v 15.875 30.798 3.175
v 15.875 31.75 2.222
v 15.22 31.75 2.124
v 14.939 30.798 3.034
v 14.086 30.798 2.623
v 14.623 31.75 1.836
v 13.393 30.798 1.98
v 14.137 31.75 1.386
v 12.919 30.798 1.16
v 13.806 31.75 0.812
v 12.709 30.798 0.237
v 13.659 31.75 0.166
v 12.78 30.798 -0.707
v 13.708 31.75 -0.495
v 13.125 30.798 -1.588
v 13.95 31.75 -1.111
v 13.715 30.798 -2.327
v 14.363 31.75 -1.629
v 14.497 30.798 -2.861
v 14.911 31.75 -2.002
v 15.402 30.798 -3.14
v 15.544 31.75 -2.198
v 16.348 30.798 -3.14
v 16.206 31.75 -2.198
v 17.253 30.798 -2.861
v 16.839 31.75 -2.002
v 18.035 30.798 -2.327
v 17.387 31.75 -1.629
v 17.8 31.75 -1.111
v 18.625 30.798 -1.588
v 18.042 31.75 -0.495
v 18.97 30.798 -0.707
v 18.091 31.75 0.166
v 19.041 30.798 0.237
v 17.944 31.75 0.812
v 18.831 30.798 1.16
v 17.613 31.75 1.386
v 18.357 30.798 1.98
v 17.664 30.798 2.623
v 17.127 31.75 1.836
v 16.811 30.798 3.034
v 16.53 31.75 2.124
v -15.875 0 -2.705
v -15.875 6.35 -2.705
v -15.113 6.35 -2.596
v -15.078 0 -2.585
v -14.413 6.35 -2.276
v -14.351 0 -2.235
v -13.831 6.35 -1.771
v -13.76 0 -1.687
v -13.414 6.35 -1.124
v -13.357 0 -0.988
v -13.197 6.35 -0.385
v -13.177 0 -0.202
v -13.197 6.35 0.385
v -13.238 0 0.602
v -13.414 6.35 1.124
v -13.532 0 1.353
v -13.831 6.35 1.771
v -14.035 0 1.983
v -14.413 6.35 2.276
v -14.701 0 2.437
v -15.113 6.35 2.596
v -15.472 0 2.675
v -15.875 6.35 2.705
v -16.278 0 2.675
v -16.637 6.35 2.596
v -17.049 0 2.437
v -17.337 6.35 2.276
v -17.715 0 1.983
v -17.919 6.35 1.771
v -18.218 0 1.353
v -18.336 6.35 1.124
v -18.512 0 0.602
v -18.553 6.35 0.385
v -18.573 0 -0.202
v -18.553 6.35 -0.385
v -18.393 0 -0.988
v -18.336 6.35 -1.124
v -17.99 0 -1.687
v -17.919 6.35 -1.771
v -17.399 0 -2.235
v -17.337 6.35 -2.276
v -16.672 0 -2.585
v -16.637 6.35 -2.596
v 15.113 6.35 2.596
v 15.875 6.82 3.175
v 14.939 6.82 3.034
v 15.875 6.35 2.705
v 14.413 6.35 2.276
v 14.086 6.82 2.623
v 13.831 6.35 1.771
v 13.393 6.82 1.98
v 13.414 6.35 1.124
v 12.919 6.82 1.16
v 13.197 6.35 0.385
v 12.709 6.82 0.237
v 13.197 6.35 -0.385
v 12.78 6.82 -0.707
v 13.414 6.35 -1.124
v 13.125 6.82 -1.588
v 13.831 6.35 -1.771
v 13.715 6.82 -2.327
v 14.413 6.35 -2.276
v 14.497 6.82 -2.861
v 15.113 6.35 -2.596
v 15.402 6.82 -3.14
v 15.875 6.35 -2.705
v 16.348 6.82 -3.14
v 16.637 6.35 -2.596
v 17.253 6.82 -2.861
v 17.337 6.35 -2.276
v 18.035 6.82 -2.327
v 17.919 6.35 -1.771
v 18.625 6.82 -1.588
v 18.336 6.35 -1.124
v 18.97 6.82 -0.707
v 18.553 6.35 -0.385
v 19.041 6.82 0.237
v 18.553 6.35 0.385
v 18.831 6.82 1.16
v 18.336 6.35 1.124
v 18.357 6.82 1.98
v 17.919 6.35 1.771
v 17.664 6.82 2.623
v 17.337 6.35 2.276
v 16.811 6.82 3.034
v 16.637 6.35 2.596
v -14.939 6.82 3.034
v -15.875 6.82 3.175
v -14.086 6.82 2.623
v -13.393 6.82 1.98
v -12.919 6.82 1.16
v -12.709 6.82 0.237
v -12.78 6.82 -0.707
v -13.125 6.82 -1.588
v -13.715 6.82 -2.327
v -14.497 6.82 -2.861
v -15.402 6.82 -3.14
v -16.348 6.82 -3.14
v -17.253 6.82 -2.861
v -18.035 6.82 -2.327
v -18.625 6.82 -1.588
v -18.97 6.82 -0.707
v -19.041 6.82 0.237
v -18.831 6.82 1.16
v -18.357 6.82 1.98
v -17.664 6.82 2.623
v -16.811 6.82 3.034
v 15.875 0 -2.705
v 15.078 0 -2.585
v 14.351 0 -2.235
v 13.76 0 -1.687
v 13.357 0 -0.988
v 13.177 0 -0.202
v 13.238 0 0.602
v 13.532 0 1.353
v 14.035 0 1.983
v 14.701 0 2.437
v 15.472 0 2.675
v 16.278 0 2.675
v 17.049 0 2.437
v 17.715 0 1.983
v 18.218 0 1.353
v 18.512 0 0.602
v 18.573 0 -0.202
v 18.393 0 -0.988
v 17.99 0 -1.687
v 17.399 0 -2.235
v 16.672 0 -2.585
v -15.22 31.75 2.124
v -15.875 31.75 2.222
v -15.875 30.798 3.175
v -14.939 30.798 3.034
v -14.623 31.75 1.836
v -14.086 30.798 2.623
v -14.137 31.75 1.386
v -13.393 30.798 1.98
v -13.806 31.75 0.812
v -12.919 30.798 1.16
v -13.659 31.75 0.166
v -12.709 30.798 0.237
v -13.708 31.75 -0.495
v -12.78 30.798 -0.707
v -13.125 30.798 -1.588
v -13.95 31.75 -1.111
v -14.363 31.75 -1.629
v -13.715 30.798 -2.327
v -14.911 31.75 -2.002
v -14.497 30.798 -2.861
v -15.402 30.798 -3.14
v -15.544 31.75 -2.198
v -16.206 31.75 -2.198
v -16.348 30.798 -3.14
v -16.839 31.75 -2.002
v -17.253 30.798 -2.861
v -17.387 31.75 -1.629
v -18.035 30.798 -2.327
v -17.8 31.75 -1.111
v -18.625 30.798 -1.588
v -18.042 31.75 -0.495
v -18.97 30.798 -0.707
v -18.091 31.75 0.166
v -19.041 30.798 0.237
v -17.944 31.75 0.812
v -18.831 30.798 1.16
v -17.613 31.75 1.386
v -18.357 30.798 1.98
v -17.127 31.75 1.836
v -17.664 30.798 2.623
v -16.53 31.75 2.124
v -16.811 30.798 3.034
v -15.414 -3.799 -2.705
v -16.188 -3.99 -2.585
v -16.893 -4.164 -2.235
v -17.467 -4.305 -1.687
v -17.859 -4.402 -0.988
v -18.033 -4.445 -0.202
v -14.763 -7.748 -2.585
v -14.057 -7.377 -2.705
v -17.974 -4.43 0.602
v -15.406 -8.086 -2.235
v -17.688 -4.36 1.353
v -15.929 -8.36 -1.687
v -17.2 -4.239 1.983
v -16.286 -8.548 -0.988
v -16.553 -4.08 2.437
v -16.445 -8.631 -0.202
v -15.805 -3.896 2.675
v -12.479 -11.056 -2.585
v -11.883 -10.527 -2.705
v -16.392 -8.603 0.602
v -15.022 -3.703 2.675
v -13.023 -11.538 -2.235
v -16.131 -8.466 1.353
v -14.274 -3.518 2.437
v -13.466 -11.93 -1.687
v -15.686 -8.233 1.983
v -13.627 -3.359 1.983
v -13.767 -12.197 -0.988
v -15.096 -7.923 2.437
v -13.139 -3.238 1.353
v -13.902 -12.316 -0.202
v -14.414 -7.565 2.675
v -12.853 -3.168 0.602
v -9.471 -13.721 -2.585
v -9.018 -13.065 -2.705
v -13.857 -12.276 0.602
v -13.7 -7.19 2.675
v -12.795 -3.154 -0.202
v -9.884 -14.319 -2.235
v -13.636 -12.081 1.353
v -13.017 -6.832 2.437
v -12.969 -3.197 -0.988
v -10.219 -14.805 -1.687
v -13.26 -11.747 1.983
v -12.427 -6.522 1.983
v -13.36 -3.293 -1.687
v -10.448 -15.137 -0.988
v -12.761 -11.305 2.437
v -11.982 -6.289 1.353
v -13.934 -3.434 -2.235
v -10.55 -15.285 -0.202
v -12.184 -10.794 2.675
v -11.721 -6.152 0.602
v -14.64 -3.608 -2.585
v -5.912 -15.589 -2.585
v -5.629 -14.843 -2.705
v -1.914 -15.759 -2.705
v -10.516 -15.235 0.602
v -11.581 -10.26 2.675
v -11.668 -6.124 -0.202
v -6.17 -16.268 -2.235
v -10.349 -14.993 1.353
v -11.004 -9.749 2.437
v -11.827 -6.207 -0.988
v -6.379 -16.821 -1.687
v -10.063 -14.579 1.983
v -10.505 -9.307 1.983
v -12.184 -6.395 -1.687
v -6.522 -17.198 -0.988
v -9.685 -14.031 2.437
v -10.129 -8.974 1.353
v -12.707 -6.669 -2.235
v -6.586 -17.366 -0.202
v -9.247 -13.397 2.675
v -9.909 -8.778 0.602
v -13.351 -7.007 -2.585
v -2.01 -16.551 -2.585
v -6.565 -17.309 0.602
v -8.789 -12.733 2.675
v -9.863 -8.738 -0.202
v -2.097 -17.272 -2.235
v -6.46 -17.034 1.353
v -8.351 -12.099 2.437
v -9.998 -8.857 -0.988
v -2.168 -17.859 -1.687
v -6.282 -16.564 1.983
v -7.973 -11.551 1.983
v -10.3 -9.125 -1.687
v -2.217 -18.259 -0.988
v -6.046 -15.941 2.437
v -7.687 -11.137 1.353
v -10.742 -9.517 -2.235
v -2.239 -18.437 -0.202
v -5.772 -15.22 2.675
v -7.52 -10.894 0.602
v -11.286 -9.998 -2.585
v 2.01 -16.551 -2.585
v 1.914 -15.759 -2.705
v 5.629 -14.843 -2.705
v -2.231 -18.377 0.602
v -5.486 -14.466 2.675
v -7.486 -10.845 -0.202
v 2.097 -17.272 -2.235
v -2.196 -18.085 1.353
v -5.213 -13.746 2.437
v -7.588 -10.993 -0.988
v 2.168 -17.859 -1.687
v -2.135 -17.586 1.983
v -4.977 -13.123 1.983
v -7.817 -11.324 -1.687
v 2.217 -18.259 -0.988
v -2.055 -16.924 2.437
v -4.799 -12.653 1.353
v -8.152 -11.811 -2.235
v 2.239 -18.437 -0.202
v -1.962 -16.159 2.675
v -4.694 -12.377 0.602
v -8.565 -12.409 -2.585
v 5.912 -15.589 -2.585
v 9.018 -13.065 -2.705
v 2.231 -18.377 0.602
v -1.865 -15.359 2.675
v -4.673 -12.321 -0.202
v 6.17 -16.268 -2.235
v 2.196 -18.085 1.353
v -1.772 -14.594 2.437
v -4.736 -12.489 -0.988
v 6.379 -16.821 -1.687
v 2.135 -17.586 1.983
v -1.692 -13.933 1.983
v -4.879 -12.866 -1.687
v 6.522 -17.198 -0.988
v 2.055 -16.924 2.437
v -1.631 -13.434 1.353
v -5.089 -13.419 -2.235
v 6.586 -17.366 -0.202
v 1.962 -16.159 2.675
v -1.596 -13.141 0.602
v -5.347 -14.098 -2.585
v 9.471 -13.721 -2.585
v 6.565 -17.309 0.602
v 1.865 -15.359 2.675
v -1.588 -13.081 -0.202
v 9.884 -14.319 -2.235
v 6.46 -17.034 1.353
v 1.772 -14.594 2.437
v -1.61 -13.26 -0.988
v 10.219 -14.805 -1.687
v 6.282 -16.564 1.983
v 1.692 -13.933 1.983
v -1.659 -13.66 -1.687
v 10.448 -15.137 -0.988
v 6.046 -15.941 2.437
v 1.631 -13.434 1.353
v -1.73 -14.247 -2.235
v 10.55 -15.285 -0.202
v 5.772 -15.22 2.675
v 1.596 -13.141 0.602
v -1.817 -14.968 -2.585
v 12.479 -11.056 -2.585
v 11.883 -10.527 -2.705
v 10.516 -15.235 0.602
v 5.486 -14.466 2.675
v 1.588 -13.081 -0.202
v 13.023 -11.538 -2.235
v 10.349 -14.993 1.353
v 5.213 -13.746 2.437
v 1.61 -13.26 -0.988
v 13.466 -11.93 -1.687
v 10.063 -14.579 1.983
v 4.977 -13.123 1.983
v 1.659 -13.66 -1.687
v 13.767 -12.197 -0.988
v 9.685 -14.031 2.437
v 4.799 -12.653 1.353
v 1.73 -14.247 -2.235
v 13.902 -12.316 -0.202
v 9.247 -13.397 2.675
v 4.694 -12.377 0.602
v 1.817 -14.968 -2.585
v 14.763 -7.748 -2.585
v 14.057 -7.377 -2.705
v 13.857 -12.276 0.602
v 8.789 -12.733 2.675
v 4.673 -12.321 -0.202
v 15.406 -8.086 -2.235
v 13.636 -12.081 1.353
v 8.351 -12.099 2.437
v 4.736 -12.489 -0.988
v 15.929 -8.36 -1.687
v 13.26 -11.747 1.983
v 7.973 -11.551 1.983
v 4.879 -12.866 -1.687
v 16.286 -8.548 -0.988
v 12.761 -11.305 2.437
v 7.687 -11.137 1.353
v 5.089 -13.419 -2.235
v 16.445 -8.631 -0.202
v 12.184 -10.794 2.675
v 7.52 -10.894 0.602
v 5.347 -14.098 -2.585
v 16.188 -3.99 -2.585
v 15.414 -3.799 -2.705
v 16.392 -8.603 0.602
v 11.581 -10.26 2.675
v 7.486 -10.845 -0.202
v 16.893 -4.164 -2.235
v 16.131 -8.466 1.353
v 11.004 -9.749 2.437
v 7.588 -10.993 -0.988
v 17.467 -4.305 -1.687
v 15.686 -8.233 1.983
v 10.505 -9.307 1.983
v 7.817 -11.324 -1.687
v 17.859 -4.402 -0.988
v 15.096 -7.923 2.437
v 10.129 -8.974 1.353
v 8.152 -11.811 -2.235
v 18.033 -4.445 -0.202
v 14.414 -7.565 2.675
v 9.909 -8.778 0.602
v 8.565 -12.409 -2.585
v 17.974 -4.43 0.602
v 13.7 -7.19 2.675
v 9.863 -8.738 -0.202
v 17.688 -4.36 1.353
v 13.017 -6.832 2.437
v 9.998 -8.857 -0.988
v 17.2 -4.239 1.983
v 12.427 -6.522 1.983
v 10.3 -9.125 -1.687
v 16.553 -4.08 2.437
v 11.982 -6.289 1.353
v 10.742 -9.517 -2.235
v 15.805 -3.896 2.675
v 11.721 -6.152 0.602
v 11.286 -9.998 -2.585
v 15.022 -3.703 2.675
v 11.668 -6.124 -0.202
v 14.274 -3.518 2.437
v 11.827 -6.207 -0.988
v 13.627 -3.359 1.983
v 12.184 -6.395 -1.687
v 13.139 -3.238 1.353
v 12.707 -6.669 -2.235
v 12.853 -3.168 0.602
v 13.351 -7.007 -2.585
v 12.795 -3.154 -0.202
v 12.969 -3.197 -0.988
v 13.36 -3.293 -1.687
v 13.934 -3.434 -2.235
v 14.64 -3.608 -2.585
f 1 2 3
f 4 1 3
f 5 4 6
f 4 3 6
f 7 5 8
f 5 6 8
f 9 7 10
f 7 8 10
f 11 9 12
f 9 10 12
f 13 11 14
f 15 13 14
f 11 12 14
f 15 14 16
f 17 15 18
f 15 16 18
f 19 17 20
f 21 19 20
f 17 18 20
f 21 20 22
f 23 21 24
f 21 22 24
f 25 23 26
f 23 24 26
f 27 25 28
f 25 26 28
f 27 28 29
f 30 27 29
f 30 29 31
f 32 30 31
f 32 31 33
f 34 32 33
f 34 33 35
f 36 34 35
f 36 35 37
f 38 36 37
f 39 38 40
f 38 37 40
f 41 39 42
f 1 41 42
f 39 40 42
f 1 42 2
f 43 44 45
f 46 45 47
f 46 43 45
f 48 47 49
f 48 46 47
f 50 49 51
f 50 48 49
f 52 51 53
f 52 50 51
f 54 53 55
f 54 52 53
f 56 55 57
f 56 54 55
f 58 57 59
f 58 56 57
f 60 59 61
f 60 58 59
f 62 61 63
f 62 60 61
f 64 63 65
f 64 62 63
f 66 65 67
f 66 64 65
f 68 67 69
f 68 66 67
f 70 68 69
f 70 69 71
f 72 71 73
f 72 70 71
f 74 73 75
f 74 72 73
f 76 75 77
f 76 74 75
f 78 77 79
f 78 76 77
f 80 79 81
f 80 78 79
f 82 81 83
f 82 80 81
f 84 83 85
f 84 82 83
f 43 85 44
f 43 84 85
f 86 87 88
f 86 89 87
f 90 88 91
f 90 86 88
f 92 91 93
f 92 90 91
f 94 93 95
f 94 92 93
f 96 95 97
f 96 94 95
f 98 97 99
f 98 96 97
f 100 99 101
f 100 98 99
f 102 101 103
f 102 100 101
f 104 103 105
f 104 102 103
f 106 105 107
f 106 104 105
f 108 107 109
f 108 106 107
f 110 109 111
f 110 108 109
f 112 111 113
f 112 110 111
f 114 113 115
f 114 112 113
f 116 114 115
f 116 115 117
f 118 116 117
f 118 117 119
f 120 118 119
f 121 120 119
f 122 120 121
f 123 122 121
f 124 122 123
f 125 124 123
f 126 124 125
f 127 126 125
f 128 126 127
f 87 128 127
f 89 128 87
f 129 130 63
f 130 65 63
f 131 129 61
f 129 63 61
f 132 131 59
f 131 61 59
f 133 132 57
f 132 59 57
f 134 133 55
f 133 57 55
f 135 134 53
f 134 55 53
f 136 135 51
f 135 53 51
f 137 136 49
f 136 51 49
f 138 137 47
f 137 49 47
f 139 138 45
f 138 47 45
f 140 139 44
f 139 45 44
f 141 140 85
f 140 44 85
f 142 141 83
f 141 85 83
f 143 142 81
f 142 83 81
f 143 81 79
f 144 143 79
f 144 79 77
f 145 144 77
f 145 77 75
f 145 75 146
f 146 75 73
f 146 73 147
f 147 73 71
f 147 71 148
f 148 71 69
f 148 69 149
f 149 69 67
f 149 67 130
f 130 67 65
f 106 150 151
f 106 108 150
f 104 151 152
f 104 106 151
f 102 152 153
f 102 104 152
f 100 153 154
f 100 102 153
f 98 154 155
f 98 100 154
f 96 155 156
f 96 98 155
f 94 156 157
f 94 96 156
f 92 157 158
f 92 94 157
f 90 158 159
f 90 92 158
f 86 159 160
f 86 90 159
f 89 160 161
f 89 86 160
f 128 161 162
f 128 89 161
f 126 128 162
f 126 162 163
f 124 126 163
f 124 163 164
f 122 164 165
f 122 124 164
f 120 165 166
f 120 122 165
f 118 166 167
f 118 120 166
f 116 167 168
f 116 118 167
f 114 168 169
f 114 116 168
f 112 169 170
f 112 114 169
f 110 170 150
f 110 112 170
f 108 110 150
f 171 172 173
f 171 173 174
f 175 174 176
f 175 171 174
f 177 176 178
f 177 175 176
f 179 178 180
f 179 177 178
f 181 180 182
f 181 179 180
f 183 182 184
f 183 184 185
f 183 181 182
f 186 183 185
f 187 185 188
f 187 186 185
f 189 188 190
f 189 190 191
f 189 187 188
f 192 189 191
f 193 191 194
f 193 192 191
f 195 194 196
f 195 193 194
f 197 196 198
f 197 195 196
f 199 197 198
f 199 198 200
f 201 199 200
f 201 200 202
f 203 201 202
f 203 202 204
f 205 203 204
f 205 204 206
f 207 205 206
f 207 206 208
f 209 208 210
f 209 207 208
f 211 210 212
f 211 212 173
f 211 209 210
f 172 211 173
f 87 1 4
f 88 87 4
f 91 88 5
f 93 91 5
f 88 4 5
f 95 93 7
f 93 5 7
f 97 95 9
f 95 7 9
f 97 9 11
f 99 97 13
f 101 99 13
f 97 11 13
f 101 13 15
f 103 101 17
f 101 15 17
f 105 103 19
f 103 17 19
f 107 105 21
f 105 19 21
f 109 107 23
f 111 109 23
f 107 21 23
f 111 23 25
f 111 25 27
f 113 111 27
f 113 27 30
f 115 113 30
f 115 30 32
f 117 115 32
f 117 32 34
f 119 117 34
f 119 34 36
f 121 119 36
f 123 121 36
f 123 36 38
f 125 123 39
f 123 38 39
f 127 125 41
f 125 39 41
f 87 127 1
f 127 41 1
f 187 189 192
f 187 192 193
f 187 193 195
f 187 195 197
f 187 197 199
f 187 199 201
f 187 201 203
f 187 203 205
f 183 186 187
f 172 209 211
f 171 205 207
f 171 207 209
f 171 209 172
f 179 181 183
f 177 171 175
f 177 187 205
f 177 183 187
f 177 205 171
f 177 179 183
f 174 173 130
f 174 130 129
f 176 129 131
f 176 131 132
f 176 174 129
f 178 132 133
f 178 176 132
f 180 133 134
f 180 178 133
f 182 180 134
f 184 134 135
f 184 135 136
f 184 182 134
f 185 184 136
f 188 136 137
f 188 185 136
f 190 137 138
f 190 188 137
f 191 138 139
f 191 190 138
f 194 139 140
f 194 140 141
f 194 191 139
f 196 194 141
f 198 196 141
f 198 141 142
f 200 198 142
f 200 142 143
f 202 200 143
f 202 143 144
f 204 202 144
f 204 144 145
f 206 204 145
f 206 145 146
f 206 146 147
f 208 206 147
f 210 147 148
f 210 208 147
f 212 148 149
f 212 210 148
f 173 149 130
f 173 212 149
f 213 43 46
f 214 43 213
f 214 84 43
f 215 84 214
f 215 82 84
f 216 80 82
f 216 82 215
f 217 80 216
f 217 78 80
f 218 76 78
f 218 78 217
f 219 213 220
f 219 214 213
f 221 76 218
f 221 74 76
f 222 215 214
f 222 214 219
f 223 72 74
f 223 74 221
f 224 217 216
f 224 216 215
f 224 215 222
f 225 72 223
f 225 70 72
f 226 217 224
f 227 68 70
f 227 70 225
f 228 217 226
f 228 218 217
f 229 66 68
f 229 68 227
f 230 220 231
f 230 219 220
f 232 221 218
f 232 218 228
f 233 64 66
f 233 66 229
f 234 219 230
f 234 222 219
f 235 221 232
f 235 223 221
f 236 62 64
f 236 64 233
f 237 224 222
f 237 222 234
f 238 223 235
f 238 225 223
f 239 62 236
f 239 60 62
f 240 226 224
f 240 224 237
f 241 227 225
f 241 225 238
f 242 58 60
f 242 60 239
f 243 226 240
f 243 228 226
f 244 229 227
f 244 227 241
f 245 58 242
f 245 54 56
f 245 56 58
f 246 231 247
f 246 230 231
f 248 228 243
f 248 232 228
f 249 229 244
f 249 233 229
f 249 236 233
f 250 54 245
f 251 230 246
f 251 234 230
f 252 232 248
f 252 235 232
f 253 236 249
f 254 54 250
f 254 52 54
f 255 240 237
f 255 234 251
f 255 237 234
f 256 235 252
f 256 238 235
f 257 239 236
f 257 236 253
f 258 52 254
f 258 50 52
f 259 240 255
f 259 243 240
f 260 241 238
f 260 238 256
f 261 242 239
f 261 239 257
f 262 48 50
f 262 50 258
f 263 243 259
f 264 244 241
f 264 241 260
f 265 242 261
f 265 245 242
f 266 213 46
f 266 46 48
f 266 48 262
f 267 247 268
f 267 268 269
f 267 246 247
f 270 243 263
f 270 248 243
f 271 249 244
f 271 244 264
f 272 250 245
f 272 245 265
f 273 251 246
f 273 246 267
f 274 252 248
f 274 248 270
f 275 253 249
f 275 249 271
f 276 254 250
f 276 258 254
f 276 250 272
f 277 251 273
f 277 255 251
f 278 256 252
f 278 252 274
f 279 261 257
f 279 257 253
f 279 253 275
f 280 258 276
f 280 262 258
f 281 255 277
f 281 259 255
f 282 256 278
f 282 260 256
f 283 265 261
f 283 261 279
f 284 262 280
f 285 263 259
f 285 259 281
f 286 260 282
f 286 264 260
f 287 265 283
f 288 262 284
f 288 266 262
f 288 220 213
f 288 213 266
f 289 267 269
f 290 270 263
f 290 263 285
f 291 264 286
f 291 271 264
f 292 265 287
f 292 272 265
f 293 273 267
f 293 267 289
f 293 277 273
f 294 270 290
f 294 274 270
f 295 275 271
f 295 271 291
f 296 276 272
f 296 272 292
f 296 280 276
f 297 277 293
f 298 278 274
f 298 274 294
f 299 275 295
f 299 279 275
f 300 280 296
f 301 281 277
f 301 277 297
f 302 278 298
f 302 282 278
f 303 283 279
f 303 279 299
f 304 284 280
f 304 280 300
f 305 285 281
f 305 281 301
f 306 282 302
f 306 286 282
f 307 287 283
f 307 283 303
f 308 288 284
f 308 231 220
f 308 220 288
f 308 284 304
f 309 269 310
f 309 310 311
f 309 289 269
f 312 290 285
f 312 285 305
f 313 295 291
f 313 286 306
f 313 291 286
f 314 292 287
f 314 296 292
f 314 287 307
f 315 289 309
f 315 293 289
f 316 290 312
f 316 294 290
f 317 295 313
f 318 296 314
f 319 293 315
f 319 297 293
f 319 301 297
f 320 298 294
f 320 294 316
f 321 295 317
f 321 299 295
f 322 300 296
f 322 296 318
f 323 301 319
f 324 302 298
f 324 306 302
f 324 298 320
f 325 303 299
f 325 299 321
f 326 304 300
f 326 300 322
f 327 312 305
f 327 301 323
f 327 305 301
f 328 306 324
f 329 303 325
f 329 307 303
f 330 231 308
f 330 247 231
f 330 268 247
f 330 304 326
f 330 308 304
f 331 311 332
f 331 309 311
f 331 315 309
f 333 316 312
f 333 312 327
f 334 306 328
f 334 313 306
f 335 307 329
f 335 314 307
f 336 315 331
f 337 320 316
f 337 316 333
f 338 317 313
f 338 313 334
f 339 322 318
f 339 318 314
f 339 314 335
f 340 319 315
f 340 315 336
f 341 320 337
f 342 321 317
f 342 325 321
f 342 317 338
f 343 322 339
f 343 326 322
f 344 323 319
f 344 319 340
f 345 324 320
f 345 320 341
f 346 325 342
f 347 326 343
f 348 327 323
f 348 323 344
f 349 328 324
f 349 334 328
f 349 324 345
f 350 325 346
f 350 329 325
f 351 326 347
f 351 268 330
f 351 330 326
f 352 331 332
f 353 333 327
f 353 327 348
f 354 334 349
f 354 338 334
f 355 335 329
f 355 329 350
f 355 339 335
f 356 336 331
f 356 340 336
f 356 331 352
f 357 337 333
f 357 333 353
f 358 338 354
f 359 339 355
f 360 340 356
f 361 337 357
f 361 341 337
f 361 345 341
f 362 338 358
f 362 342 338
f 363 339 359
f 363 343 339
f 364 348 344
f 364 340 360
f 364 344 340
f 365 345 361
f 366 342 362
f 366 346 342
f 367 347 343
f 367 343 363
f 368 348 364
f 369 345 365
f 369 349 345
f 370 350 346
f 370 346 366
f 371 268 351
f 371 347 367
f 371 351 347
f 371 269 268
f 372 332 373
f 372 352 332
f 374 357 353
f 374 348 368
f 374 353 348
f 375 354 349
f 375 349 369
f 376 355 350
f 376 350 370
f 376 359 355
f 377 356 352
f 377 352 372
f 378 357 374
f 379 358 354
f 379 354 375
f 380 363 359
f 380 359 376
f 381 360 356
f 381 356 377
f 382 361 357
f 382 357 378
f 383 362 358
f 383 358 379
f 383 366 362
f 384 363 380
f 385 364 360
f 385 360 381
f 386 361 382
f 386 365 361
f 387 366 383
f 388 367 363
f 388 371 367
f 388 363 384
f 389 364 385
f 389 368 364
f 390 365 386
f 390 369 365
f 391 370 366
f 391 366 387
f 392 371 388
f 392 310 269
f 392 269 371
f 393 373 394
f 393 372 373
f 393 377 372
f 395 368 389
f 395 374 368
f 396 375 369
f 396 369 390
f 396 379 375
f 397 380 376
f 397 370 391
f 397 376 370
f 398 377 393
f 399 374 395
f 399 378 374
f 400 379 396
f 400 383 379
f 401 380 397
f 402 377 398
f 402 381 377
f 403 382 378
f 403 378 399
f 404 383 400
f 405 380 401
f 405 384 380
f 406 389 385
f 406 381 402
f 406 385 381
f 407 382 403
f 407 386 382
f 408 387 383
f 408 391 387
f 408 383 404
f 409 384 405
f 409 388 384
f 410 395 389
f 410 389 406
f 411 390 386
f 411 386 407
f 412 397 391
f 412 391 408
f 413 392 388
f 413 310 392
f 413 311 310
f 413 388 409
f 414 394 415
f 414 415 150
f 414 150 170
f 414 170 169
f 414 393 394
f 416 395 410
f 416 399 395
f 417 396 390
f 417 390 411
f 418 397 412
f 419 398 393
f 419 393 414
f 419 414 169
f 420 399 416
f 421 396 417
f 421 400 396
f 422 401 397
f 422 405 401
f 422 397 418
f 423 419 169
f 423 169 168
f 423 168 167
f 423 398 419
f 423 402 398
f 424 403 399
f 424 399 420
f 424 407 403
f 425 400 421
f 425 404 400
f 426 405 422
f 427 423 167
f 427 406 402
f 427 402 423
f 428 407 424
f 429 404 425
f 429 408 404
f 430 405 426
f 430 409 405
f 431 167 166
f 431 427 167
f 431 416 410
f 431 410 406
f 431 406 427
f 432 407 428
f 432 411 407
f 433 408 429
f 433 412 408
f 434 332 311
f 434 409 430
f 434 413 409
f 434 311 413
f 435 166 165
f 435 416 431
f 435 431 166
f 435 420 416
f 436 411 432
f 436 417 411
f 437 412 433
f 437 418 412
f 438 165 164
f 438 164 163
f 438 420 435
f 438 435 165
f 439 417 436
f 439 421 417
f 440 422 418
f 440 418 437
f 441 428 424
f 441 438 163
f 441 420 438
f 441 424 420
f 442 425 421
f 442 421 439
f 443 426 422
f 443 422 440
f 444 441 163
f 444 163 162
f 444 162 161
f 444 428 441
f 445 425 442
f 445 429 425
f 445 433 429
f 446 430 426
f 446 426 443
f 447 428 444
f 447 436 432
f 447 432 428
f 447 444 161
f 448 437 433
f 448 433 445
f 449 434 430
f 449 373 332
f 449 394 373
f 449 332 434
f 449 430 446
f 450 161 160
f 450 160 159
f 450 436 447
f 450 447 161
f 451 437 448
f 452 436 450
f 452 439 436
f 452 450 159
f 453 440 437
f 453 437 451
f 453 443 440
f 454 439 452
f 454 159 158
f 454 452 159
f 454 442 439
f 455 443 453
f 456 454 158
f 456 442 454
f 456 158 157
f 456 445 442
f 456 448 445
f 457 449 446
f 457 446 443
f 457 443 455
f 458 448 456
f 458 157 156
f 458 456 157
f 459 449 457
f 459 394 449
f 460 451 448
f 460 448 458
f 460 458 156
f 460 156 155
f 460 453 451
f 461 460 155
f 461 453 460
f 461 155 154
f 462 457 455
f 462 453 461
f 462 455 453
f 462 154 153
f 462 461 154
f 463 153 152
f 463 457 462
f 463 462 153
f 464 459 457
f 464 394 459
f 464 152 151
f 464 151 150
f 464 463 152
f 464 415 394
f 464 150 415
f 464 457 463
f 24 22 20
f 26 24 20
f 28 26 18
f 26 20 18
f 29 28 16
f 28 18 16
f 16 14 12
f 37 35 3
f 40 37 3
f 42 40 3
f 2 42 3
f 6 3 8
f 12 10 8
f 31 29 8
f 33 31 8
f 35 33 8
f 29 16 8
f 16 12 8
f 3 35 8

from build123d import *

# Parameters (mm, degrees)
SKETCH2_R           = 3.175
BOSS_EXTRUDE1_DEPTH = 25.4
CHAMFER2_SIZE       = 0.9525
CHAMFER3_SIZE       = 0.4699
SKETCH12_R          = 2.7051
SKETCH9_R           = 3.175
BOSS_EXTRUDE2_DEPTH = 2.778125
SKETCH10_OUTSIDE_W  = 233.937
SKETCH10_OUTSIDE_H  = 203.708
SKETCH10_OUTSIDE_R  = 5.55625
CUT_EXTRUDE1_DEPTH  = 51.205782884
CUT_EXTRUDE1_DRAFT  = -60
SKETCH11_OUTSIDE_W  = 217.071
SKETCH11_OUTSIDE_H  = 186.842
SKETCH11_OUTSIDE_R  = 5.55625
CUT_EXTRUDE2_DEPTH  = 46.336665415
CUT_EXTRUDE2_DRAFT  = -60
CHAMFER4_SIZE       = 0.381
LPATTERN1_COUNT     = 2
LPATTERN1_PITCH     = 31.75


with BuildPart() as part:
    # Sketch2 → Boss-Extrude1 (new body)
    with BuildSketch(Plane(origin=(0, 31.75, 0), x_dir=(-1, 0, 0), z_dir=(0, 1, 0))):
        with Locations(Location((15.875, 0, 0), (0, 0, 90))):
            Circle(SKETCH2_R)
    extrude(amount=-BOSS_EXTRUDE1_DEPTH)

    # Chamfer2
    chamfer2_edges = [part.edges().sort_by_distance(p)[0] for p in [
        (-15.875, 31.75, -3.175),
    ]]
    chamfer(chamfer2_edges, length=CHAMFER2_SIZE)

    # Chamfer3
    chamfer3_edges = [part.edges().sort_by_distance(p)[0] for p in [
        (-15.875, 6.35, -3.175),
    ]]
    chamfer(chamfer3_edges, length=CHAMFER3_SIZE)


with BuildPart() as body_2:
    # Mirror2: mirrored copy
    add(part.part.mirror(Plane(origin=(0, 0, 0), x_dir=(0, 0, 1), z_dir=(1, 0, 0))))


with BuildPart() as part_1:
    add(part.part)

    add(body_2.part)  # Sweep1 merges body 2
    # Sweep1: sweep along a path in Sketch8
    with BuildLine(Plane.XY) as sweep1_path:
        Line((-15.875, 19.05), (-15.875, 0))
        ThreePointArc((-15.875, 0), (0, -15.875), (15.875, 0))
        Line((15.875, 0), (15.875, 19.05))
    # Sketch12 → Sweep1 (sweep)
    with BuildSketch(Plane(origin=(0, 0, 0), x_dir=(0, 0, -1), z_dir=(1, 0, 0))):
        with Locations((0, -15.875)):
            Circle(SKETCH12_R)
    sweep(path=sweep1_path.line)


with BuildPart() as body_2_2:
    # Sketch9 → Boss-Extrude2 (new, symmetric)
    with BuildSketch(Plane(origin=(0, 23.283333333, 0), x_dir=(-1, 0, 0), z_dir=(0, 1, 0))):
        Polygon((-19.082902433, 5.55625), (-22.290804866, 0), (-19.082902433, -5.55625), (-12.667097567, -5.55625), (-9.459195134, 0), (-12.667097567, 5.55625), align=None)
        with Locations(Location((-15.875, 0, 0), (0, 0, 90))):
            Circle(SKETCH9_R, mode=Mode.SUBTRACT)
    extrude(amount=BOSS_EXTRUDE2_DEPTH, both=True)


with BuildPart() as cut_extrude1_tool:
    # Sketch10 outside → Cut-Extrude1 (with draft: the straight prism first)
    with BuildSketch(Plane(origin=(0, 26.061458333, 0), x_dir=(1, 0, 0), z_dir=(0, 1, 0))):
        with Locations((1.6205, 0)):
            Rectangle(SKETCH10_OUTSIDE_W, SKETCH10_OUTSIDE_H)
        with Locations((15.875, 0)):
            Circle(SKETCH10_OUTSIDE_R, mode=Mode.SUBTRACT)
    extrude(amount=-CUT_EXTRUDE1_DEPTH)
    # Cut-Extrude1: the draft: its side faces are tilted about the plane it starts from
    cut_extrude1_sides = [cut_extrude1_tool.faces().sort_by_distance(p)[0] for p in [
        (1.6205, 0.458566891, 101.854),
        (118.589, 0.458566891, 0),
        (1.6205, 0.458566891, -101.854),
        (-115.348, 0.458566891, 0),
        (10.31875, 0.458566891, 0),
    ]]
    draft(cut_extrude1_sides, Plane(origin=(0, 26.061458333, 0), x_dir=(1, 0, 0), z_dir=(0, 1, 0)), CUT_EXTRUDE1_DRAFT)


with BuildPart() as body_2_2_1:
    add(body_2_2.part)

    # Cut-Extrude1: cut by cut_extrude1_tool
    add(cut_extrude1_tool.part, mode=Mode.SUBTRACT)


with BuildPart() as cut_extrude2_tool:
    # Sketch11 outside → Cut-Extrude2 (with draft: the straight prism first)
    with BuildSketch(Plane.XZ.offset(-20.505208333)):
        with Locations((1.6205, 0)):
            Rectangle(SKETCH11_OUTSIDE_W, SKETCH11_OUTSIDE_H)
        with Locations((15.875, 0)):
            Circle(SKETCH11_OUTSIDE_R, mode=Mode.SUBTRACT)
    extrude(amount=-CUT_EXTRUDE2_DEPTH)
    # Cut-Extrude2: the draft: its side faces are tilted about the plane it starts from
    cut_extrude2_sides = [cut_extrude2_tool.faces().sort_by_distance(p)[0] for p in [
        (1.6205, 43.673541041, -93.421),
        (110.156, 43.673541041, 0),
        (1.6205, 43.673541041, 93.421),
        (-106.915, 43.673541041, 0),
        (10.31875, 43.673541041, 0),
    ]]
    draft(cut_extrude2_sides, Plane.XZ.offset(-20.505208333), CUT_EXTRUDE2_DRAFT)


with BuildPart() as body_2_2_2:
    add(body_2_2_1.part)

    # Cut-Extrude2: cut by cut_extrude2_tool
    add(cut_extrude2_tool.part, mode=Mode.SUBTRACT)

    # Chamfer4
    chamfer4_edges = [body_2_2_2.edges().sort_by_distance(p)[0] for p in [
        (15.875, 20.505208333, -3.175),
        (15.875, 26.061458333, -3.175),
    ]]
    chamfer(chamfer4_edges, length=CHAMFER4_SIZE)


with BuildPart() as lpattern1_1:
    # LPattern1: pattern copy
    add(body_2_2_2.part.moved(Location(Vector(-1, 0, 0) * (1 * LPATTERN1_PITCH))))


solid = part_1.part
